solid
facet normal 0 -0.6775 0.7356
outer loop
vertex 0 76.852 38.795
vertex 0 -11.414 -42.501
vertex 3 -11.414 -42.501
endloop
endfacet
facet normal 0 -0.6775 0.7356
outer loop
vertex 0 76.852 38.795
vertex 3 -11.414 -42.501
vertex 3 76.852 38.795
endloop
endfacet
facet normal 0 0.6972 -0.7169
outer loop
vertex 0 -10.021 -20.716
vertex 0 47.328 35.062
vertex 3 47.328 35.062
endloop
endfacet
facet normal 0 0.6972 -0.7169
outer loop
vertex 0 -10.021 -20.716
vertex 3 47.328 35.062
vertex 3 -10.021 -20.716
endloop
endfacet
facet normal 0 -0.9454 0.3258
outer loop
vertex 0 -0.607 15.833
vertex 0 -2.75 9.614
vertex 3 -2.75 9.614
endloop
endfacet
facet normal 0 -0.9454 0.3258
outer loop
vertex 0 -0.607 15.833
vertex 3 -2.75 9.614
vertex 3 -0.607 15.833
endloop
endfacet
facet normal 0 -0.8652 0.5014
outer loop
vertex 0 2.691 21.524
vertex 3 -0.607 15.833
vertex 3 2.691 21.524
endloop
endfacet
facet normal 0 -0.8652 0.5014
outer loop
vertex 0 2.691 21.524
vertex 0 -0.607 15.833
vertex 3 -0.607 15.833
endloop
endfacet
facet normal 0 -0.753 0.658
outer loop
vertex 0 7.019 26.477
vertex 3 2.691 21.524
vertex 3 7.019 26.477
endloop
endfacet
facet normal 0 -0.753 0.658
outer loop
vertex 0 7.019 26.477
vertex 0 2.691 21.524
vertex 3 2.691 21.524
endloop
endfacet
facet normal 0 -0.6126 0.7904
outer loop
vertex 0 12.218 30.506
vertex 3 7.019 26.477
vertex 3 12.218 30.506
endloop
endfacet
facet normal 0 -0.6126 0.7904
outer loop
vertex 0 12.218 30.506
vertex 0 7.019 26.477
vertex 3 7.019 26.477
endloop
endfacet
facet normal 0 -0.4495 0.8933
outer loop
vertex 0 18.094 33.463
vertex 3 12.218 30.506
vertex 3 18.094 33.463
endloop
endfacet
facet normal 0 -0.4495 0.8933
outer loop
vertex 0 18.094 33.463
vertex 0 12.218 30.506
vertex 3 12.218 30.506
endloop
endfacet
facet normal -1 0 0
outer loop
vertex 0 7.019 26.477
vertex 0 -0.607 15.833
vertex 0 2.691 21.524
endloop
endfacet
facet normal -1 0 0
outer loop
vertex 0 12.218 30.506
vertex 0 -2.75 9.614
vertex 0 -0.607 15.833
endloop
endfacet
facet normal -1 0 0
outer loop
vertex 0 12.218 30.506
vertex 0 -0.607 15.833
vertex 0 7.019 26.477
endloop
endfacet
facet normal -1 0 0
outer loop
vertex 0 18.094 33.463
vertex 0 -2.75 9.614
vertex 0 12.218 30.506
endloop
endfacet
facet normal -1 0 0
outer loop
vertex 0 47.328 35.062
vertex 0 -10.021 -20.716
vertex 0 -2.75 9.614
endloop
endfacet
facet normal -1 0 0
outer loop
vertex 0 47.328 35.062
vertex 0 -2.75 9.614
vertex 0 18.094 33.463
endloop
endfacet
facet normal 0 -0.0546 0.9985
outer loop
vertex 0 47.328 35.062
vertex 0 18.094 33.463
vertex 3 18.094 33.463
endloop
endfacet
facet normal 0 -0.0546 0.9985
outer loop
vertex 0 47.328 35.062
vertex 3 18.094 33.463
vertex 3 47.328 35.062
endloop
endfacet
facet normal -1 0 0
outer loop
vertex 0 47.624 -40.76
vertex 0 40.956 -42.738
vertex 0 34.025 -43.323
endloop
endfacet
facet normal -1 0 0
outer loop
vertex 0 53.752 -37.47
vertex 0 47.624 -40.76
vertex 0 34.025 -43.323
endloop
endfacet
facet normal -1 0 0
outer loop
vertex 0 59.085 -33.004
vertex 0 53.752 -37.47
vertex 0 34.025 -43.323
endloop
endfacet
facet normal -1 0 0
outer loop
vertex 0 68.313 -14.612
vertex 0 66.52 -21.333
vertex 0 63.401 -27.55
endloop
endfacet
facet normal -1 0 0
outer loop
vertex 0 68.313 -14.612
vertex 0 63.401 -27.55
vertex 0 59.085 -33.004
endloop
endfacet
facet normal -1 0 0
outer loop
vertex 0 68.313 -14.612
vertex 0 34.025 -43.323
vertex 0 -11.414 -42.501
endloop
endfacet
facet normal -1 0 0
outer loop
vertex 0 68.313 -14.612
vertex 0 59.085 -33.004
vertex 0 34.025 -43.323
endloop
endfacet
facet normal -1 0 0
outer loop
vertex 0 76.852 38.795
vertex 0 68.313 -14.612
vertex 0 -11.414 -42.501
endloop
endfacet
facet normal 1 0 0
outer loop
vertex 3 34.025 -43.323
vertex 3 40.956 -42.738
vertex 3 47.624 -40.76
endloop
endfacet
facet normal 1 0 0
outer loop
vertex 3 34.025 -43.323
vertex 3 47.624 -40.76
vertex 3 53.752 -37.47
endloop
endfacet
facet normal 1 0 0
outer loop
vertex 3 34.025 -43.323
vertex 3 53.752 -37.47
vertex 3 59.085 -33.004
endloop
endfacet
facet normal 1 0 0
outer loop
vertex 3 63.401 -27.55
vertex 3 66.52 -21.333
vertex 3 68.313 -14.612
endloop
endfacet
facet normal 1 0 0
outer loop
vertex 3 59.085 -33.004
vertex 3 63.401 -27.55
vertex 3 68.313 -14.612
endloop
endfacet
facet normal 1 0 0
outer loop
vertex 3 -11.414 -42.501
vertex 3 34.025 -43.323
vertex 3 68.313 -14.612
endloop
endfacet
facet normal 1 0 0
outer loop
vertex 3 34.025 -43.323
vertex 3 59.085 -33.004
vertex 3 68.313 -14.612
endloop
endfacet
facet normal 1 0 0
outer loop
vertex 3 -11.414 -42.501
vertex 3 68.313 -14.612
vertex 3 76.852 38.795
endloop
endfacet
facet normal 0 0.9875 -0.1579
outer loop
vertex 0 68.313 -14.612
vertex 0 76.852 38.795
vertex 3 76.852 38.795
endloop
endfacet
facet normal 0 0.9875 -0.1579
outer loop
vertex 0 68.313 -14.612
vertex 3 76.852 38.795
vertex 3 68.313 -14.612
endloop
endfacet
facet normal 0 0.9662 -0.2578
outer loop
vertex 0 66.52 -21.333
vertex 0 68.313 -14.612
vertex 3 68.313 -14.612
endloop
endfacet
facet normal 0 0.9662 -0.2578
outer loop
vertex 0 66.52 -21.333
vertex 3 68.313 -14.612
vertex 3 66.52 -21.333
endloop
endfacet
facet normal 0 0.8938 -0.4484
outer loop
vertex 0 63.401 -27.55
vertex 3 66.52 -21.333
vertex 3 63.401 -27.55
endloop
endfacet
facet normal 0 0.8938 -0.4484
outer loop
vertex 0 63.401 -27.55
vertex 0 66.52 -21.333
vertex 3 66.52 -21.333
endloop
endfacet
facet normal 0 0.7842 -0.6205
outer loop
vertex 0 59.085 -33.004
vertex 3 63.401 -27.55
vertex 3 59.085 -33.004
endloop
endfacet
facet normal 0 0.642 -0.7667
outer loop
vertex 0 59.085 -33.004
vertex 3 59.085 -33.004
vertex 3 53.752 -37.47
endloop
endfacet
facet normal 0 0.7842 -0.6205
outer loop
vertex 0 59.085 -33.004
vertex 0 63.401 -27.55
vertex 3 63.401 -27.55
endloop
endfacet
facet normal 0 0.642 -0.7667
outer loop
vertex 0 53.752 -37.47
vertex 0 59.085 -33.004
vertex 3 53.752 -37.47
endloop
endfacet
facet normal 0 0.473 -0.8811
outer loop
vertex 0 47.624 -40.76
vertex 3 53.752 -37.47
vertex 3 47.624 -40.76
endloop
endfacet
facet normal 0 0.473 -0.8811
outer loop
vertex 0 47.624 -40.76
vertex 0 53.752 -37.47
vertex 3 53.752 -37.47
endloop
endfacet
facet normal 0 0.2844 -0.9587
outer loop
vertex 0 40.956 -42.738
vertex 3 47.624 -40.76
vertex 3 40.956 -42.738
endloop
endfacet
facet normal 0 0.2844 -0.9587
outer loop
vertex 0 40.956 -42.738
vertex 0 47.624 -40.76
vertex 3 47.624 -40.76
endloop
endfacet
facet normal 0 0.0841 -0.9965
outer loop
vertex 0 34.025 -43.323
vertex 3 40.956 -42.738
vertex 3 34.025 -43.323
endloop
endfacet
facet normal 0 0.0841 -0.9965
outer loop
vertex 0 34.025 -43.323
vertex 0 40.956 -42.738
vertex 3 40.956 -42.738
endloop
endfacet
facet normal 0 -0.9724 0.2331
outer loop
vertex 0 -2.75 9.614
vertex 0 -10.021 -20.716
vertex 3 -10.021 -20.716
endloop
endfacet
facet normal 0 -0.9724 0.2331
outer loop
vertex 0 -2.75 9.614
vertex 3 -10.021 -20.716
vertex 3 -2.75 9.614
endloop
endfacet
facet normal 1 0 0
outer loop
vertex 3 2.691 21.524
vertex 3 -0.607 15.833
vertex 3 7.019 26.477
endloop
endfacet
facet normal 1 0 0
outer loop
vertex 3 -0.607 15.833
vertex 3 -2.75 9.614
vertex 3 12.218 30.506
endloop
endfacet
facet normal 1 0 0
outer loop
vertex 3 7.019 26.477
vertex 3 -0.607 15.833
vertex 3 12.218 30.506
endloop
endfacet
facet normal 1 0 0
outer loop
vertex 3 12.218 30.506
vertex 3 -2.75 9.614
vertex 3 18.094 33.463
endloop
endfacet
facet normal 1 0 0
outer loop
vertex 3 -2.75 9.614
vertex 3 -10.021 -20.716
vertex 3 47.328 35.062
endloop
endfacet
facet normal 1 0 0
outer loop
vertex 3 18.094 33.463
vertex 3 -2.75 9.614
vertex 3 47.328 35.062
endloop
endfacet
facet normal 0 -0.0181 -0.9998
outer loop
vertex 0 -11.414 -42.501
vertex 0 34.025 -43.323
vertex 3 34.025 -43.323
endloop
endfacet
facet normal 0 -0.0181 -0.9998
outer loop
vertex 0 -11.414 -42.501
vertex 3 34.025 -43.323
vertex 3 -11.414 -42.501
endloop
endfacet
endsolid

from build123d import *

# Parameters (mm, degrees)
SALIENTE_EXTRUIR1_DEPTH   = 3
SALIENTE_EXTRUIR1_2_DEPTH = 3


with BuildPart() as part:
    # Croquis1 → Saliente-Extruir1 (new body)
    with BuildSketch(Plane(origin=(0, 0, 0), x_dir=(0, 0, -1), z_dir=(1, 0, 0))):
        with BuildLine():
            Line((-38.795102136, 76.851925702), (14.612324216, 68.312789252))
            ThreePointArc((14.612324216, 68.312789252), (35.373203511, 56.532469536), (43.322579124, 34.024749326))
            Line((43.322579124, 34.024749326), (42.501318157, -11.414104273))
            Line((42.501318157, -11.414104273), (-38.795102136, 76.851925702))
        make_face()
    extrude(amount=SALIENTE_EXTRUIR1_DEPTH)


with BuildPart() as body_2:
    # Croquis1 → Saliente-Extruir1 2 (new body)
    with BuildSketch(Plane(origin=(0, 0, 0), x_dir=(0, 0, -1), z_dir=(1, 0, 0))):
        with BuildLine():
            Line((-33.462635017, 18.094168215), (-35.062224892, 47.327776582))
            Line((-35.062224892, 47.327776582), (20.715509479, -10.0206702))
            Line((20.715509479, -10.0206702), (-9.614235223, -2.749860625))
            ThreePointArc((-9.614235223, -2.749860625), (-24.105399402, 4.73519804), (-33.462635017, 18.094168215))
        make_face()
    extrude(amount=SALIENTE_EXTRUIR1_2_DEPTH)


solid = Compound([part.part, body_2.part])
